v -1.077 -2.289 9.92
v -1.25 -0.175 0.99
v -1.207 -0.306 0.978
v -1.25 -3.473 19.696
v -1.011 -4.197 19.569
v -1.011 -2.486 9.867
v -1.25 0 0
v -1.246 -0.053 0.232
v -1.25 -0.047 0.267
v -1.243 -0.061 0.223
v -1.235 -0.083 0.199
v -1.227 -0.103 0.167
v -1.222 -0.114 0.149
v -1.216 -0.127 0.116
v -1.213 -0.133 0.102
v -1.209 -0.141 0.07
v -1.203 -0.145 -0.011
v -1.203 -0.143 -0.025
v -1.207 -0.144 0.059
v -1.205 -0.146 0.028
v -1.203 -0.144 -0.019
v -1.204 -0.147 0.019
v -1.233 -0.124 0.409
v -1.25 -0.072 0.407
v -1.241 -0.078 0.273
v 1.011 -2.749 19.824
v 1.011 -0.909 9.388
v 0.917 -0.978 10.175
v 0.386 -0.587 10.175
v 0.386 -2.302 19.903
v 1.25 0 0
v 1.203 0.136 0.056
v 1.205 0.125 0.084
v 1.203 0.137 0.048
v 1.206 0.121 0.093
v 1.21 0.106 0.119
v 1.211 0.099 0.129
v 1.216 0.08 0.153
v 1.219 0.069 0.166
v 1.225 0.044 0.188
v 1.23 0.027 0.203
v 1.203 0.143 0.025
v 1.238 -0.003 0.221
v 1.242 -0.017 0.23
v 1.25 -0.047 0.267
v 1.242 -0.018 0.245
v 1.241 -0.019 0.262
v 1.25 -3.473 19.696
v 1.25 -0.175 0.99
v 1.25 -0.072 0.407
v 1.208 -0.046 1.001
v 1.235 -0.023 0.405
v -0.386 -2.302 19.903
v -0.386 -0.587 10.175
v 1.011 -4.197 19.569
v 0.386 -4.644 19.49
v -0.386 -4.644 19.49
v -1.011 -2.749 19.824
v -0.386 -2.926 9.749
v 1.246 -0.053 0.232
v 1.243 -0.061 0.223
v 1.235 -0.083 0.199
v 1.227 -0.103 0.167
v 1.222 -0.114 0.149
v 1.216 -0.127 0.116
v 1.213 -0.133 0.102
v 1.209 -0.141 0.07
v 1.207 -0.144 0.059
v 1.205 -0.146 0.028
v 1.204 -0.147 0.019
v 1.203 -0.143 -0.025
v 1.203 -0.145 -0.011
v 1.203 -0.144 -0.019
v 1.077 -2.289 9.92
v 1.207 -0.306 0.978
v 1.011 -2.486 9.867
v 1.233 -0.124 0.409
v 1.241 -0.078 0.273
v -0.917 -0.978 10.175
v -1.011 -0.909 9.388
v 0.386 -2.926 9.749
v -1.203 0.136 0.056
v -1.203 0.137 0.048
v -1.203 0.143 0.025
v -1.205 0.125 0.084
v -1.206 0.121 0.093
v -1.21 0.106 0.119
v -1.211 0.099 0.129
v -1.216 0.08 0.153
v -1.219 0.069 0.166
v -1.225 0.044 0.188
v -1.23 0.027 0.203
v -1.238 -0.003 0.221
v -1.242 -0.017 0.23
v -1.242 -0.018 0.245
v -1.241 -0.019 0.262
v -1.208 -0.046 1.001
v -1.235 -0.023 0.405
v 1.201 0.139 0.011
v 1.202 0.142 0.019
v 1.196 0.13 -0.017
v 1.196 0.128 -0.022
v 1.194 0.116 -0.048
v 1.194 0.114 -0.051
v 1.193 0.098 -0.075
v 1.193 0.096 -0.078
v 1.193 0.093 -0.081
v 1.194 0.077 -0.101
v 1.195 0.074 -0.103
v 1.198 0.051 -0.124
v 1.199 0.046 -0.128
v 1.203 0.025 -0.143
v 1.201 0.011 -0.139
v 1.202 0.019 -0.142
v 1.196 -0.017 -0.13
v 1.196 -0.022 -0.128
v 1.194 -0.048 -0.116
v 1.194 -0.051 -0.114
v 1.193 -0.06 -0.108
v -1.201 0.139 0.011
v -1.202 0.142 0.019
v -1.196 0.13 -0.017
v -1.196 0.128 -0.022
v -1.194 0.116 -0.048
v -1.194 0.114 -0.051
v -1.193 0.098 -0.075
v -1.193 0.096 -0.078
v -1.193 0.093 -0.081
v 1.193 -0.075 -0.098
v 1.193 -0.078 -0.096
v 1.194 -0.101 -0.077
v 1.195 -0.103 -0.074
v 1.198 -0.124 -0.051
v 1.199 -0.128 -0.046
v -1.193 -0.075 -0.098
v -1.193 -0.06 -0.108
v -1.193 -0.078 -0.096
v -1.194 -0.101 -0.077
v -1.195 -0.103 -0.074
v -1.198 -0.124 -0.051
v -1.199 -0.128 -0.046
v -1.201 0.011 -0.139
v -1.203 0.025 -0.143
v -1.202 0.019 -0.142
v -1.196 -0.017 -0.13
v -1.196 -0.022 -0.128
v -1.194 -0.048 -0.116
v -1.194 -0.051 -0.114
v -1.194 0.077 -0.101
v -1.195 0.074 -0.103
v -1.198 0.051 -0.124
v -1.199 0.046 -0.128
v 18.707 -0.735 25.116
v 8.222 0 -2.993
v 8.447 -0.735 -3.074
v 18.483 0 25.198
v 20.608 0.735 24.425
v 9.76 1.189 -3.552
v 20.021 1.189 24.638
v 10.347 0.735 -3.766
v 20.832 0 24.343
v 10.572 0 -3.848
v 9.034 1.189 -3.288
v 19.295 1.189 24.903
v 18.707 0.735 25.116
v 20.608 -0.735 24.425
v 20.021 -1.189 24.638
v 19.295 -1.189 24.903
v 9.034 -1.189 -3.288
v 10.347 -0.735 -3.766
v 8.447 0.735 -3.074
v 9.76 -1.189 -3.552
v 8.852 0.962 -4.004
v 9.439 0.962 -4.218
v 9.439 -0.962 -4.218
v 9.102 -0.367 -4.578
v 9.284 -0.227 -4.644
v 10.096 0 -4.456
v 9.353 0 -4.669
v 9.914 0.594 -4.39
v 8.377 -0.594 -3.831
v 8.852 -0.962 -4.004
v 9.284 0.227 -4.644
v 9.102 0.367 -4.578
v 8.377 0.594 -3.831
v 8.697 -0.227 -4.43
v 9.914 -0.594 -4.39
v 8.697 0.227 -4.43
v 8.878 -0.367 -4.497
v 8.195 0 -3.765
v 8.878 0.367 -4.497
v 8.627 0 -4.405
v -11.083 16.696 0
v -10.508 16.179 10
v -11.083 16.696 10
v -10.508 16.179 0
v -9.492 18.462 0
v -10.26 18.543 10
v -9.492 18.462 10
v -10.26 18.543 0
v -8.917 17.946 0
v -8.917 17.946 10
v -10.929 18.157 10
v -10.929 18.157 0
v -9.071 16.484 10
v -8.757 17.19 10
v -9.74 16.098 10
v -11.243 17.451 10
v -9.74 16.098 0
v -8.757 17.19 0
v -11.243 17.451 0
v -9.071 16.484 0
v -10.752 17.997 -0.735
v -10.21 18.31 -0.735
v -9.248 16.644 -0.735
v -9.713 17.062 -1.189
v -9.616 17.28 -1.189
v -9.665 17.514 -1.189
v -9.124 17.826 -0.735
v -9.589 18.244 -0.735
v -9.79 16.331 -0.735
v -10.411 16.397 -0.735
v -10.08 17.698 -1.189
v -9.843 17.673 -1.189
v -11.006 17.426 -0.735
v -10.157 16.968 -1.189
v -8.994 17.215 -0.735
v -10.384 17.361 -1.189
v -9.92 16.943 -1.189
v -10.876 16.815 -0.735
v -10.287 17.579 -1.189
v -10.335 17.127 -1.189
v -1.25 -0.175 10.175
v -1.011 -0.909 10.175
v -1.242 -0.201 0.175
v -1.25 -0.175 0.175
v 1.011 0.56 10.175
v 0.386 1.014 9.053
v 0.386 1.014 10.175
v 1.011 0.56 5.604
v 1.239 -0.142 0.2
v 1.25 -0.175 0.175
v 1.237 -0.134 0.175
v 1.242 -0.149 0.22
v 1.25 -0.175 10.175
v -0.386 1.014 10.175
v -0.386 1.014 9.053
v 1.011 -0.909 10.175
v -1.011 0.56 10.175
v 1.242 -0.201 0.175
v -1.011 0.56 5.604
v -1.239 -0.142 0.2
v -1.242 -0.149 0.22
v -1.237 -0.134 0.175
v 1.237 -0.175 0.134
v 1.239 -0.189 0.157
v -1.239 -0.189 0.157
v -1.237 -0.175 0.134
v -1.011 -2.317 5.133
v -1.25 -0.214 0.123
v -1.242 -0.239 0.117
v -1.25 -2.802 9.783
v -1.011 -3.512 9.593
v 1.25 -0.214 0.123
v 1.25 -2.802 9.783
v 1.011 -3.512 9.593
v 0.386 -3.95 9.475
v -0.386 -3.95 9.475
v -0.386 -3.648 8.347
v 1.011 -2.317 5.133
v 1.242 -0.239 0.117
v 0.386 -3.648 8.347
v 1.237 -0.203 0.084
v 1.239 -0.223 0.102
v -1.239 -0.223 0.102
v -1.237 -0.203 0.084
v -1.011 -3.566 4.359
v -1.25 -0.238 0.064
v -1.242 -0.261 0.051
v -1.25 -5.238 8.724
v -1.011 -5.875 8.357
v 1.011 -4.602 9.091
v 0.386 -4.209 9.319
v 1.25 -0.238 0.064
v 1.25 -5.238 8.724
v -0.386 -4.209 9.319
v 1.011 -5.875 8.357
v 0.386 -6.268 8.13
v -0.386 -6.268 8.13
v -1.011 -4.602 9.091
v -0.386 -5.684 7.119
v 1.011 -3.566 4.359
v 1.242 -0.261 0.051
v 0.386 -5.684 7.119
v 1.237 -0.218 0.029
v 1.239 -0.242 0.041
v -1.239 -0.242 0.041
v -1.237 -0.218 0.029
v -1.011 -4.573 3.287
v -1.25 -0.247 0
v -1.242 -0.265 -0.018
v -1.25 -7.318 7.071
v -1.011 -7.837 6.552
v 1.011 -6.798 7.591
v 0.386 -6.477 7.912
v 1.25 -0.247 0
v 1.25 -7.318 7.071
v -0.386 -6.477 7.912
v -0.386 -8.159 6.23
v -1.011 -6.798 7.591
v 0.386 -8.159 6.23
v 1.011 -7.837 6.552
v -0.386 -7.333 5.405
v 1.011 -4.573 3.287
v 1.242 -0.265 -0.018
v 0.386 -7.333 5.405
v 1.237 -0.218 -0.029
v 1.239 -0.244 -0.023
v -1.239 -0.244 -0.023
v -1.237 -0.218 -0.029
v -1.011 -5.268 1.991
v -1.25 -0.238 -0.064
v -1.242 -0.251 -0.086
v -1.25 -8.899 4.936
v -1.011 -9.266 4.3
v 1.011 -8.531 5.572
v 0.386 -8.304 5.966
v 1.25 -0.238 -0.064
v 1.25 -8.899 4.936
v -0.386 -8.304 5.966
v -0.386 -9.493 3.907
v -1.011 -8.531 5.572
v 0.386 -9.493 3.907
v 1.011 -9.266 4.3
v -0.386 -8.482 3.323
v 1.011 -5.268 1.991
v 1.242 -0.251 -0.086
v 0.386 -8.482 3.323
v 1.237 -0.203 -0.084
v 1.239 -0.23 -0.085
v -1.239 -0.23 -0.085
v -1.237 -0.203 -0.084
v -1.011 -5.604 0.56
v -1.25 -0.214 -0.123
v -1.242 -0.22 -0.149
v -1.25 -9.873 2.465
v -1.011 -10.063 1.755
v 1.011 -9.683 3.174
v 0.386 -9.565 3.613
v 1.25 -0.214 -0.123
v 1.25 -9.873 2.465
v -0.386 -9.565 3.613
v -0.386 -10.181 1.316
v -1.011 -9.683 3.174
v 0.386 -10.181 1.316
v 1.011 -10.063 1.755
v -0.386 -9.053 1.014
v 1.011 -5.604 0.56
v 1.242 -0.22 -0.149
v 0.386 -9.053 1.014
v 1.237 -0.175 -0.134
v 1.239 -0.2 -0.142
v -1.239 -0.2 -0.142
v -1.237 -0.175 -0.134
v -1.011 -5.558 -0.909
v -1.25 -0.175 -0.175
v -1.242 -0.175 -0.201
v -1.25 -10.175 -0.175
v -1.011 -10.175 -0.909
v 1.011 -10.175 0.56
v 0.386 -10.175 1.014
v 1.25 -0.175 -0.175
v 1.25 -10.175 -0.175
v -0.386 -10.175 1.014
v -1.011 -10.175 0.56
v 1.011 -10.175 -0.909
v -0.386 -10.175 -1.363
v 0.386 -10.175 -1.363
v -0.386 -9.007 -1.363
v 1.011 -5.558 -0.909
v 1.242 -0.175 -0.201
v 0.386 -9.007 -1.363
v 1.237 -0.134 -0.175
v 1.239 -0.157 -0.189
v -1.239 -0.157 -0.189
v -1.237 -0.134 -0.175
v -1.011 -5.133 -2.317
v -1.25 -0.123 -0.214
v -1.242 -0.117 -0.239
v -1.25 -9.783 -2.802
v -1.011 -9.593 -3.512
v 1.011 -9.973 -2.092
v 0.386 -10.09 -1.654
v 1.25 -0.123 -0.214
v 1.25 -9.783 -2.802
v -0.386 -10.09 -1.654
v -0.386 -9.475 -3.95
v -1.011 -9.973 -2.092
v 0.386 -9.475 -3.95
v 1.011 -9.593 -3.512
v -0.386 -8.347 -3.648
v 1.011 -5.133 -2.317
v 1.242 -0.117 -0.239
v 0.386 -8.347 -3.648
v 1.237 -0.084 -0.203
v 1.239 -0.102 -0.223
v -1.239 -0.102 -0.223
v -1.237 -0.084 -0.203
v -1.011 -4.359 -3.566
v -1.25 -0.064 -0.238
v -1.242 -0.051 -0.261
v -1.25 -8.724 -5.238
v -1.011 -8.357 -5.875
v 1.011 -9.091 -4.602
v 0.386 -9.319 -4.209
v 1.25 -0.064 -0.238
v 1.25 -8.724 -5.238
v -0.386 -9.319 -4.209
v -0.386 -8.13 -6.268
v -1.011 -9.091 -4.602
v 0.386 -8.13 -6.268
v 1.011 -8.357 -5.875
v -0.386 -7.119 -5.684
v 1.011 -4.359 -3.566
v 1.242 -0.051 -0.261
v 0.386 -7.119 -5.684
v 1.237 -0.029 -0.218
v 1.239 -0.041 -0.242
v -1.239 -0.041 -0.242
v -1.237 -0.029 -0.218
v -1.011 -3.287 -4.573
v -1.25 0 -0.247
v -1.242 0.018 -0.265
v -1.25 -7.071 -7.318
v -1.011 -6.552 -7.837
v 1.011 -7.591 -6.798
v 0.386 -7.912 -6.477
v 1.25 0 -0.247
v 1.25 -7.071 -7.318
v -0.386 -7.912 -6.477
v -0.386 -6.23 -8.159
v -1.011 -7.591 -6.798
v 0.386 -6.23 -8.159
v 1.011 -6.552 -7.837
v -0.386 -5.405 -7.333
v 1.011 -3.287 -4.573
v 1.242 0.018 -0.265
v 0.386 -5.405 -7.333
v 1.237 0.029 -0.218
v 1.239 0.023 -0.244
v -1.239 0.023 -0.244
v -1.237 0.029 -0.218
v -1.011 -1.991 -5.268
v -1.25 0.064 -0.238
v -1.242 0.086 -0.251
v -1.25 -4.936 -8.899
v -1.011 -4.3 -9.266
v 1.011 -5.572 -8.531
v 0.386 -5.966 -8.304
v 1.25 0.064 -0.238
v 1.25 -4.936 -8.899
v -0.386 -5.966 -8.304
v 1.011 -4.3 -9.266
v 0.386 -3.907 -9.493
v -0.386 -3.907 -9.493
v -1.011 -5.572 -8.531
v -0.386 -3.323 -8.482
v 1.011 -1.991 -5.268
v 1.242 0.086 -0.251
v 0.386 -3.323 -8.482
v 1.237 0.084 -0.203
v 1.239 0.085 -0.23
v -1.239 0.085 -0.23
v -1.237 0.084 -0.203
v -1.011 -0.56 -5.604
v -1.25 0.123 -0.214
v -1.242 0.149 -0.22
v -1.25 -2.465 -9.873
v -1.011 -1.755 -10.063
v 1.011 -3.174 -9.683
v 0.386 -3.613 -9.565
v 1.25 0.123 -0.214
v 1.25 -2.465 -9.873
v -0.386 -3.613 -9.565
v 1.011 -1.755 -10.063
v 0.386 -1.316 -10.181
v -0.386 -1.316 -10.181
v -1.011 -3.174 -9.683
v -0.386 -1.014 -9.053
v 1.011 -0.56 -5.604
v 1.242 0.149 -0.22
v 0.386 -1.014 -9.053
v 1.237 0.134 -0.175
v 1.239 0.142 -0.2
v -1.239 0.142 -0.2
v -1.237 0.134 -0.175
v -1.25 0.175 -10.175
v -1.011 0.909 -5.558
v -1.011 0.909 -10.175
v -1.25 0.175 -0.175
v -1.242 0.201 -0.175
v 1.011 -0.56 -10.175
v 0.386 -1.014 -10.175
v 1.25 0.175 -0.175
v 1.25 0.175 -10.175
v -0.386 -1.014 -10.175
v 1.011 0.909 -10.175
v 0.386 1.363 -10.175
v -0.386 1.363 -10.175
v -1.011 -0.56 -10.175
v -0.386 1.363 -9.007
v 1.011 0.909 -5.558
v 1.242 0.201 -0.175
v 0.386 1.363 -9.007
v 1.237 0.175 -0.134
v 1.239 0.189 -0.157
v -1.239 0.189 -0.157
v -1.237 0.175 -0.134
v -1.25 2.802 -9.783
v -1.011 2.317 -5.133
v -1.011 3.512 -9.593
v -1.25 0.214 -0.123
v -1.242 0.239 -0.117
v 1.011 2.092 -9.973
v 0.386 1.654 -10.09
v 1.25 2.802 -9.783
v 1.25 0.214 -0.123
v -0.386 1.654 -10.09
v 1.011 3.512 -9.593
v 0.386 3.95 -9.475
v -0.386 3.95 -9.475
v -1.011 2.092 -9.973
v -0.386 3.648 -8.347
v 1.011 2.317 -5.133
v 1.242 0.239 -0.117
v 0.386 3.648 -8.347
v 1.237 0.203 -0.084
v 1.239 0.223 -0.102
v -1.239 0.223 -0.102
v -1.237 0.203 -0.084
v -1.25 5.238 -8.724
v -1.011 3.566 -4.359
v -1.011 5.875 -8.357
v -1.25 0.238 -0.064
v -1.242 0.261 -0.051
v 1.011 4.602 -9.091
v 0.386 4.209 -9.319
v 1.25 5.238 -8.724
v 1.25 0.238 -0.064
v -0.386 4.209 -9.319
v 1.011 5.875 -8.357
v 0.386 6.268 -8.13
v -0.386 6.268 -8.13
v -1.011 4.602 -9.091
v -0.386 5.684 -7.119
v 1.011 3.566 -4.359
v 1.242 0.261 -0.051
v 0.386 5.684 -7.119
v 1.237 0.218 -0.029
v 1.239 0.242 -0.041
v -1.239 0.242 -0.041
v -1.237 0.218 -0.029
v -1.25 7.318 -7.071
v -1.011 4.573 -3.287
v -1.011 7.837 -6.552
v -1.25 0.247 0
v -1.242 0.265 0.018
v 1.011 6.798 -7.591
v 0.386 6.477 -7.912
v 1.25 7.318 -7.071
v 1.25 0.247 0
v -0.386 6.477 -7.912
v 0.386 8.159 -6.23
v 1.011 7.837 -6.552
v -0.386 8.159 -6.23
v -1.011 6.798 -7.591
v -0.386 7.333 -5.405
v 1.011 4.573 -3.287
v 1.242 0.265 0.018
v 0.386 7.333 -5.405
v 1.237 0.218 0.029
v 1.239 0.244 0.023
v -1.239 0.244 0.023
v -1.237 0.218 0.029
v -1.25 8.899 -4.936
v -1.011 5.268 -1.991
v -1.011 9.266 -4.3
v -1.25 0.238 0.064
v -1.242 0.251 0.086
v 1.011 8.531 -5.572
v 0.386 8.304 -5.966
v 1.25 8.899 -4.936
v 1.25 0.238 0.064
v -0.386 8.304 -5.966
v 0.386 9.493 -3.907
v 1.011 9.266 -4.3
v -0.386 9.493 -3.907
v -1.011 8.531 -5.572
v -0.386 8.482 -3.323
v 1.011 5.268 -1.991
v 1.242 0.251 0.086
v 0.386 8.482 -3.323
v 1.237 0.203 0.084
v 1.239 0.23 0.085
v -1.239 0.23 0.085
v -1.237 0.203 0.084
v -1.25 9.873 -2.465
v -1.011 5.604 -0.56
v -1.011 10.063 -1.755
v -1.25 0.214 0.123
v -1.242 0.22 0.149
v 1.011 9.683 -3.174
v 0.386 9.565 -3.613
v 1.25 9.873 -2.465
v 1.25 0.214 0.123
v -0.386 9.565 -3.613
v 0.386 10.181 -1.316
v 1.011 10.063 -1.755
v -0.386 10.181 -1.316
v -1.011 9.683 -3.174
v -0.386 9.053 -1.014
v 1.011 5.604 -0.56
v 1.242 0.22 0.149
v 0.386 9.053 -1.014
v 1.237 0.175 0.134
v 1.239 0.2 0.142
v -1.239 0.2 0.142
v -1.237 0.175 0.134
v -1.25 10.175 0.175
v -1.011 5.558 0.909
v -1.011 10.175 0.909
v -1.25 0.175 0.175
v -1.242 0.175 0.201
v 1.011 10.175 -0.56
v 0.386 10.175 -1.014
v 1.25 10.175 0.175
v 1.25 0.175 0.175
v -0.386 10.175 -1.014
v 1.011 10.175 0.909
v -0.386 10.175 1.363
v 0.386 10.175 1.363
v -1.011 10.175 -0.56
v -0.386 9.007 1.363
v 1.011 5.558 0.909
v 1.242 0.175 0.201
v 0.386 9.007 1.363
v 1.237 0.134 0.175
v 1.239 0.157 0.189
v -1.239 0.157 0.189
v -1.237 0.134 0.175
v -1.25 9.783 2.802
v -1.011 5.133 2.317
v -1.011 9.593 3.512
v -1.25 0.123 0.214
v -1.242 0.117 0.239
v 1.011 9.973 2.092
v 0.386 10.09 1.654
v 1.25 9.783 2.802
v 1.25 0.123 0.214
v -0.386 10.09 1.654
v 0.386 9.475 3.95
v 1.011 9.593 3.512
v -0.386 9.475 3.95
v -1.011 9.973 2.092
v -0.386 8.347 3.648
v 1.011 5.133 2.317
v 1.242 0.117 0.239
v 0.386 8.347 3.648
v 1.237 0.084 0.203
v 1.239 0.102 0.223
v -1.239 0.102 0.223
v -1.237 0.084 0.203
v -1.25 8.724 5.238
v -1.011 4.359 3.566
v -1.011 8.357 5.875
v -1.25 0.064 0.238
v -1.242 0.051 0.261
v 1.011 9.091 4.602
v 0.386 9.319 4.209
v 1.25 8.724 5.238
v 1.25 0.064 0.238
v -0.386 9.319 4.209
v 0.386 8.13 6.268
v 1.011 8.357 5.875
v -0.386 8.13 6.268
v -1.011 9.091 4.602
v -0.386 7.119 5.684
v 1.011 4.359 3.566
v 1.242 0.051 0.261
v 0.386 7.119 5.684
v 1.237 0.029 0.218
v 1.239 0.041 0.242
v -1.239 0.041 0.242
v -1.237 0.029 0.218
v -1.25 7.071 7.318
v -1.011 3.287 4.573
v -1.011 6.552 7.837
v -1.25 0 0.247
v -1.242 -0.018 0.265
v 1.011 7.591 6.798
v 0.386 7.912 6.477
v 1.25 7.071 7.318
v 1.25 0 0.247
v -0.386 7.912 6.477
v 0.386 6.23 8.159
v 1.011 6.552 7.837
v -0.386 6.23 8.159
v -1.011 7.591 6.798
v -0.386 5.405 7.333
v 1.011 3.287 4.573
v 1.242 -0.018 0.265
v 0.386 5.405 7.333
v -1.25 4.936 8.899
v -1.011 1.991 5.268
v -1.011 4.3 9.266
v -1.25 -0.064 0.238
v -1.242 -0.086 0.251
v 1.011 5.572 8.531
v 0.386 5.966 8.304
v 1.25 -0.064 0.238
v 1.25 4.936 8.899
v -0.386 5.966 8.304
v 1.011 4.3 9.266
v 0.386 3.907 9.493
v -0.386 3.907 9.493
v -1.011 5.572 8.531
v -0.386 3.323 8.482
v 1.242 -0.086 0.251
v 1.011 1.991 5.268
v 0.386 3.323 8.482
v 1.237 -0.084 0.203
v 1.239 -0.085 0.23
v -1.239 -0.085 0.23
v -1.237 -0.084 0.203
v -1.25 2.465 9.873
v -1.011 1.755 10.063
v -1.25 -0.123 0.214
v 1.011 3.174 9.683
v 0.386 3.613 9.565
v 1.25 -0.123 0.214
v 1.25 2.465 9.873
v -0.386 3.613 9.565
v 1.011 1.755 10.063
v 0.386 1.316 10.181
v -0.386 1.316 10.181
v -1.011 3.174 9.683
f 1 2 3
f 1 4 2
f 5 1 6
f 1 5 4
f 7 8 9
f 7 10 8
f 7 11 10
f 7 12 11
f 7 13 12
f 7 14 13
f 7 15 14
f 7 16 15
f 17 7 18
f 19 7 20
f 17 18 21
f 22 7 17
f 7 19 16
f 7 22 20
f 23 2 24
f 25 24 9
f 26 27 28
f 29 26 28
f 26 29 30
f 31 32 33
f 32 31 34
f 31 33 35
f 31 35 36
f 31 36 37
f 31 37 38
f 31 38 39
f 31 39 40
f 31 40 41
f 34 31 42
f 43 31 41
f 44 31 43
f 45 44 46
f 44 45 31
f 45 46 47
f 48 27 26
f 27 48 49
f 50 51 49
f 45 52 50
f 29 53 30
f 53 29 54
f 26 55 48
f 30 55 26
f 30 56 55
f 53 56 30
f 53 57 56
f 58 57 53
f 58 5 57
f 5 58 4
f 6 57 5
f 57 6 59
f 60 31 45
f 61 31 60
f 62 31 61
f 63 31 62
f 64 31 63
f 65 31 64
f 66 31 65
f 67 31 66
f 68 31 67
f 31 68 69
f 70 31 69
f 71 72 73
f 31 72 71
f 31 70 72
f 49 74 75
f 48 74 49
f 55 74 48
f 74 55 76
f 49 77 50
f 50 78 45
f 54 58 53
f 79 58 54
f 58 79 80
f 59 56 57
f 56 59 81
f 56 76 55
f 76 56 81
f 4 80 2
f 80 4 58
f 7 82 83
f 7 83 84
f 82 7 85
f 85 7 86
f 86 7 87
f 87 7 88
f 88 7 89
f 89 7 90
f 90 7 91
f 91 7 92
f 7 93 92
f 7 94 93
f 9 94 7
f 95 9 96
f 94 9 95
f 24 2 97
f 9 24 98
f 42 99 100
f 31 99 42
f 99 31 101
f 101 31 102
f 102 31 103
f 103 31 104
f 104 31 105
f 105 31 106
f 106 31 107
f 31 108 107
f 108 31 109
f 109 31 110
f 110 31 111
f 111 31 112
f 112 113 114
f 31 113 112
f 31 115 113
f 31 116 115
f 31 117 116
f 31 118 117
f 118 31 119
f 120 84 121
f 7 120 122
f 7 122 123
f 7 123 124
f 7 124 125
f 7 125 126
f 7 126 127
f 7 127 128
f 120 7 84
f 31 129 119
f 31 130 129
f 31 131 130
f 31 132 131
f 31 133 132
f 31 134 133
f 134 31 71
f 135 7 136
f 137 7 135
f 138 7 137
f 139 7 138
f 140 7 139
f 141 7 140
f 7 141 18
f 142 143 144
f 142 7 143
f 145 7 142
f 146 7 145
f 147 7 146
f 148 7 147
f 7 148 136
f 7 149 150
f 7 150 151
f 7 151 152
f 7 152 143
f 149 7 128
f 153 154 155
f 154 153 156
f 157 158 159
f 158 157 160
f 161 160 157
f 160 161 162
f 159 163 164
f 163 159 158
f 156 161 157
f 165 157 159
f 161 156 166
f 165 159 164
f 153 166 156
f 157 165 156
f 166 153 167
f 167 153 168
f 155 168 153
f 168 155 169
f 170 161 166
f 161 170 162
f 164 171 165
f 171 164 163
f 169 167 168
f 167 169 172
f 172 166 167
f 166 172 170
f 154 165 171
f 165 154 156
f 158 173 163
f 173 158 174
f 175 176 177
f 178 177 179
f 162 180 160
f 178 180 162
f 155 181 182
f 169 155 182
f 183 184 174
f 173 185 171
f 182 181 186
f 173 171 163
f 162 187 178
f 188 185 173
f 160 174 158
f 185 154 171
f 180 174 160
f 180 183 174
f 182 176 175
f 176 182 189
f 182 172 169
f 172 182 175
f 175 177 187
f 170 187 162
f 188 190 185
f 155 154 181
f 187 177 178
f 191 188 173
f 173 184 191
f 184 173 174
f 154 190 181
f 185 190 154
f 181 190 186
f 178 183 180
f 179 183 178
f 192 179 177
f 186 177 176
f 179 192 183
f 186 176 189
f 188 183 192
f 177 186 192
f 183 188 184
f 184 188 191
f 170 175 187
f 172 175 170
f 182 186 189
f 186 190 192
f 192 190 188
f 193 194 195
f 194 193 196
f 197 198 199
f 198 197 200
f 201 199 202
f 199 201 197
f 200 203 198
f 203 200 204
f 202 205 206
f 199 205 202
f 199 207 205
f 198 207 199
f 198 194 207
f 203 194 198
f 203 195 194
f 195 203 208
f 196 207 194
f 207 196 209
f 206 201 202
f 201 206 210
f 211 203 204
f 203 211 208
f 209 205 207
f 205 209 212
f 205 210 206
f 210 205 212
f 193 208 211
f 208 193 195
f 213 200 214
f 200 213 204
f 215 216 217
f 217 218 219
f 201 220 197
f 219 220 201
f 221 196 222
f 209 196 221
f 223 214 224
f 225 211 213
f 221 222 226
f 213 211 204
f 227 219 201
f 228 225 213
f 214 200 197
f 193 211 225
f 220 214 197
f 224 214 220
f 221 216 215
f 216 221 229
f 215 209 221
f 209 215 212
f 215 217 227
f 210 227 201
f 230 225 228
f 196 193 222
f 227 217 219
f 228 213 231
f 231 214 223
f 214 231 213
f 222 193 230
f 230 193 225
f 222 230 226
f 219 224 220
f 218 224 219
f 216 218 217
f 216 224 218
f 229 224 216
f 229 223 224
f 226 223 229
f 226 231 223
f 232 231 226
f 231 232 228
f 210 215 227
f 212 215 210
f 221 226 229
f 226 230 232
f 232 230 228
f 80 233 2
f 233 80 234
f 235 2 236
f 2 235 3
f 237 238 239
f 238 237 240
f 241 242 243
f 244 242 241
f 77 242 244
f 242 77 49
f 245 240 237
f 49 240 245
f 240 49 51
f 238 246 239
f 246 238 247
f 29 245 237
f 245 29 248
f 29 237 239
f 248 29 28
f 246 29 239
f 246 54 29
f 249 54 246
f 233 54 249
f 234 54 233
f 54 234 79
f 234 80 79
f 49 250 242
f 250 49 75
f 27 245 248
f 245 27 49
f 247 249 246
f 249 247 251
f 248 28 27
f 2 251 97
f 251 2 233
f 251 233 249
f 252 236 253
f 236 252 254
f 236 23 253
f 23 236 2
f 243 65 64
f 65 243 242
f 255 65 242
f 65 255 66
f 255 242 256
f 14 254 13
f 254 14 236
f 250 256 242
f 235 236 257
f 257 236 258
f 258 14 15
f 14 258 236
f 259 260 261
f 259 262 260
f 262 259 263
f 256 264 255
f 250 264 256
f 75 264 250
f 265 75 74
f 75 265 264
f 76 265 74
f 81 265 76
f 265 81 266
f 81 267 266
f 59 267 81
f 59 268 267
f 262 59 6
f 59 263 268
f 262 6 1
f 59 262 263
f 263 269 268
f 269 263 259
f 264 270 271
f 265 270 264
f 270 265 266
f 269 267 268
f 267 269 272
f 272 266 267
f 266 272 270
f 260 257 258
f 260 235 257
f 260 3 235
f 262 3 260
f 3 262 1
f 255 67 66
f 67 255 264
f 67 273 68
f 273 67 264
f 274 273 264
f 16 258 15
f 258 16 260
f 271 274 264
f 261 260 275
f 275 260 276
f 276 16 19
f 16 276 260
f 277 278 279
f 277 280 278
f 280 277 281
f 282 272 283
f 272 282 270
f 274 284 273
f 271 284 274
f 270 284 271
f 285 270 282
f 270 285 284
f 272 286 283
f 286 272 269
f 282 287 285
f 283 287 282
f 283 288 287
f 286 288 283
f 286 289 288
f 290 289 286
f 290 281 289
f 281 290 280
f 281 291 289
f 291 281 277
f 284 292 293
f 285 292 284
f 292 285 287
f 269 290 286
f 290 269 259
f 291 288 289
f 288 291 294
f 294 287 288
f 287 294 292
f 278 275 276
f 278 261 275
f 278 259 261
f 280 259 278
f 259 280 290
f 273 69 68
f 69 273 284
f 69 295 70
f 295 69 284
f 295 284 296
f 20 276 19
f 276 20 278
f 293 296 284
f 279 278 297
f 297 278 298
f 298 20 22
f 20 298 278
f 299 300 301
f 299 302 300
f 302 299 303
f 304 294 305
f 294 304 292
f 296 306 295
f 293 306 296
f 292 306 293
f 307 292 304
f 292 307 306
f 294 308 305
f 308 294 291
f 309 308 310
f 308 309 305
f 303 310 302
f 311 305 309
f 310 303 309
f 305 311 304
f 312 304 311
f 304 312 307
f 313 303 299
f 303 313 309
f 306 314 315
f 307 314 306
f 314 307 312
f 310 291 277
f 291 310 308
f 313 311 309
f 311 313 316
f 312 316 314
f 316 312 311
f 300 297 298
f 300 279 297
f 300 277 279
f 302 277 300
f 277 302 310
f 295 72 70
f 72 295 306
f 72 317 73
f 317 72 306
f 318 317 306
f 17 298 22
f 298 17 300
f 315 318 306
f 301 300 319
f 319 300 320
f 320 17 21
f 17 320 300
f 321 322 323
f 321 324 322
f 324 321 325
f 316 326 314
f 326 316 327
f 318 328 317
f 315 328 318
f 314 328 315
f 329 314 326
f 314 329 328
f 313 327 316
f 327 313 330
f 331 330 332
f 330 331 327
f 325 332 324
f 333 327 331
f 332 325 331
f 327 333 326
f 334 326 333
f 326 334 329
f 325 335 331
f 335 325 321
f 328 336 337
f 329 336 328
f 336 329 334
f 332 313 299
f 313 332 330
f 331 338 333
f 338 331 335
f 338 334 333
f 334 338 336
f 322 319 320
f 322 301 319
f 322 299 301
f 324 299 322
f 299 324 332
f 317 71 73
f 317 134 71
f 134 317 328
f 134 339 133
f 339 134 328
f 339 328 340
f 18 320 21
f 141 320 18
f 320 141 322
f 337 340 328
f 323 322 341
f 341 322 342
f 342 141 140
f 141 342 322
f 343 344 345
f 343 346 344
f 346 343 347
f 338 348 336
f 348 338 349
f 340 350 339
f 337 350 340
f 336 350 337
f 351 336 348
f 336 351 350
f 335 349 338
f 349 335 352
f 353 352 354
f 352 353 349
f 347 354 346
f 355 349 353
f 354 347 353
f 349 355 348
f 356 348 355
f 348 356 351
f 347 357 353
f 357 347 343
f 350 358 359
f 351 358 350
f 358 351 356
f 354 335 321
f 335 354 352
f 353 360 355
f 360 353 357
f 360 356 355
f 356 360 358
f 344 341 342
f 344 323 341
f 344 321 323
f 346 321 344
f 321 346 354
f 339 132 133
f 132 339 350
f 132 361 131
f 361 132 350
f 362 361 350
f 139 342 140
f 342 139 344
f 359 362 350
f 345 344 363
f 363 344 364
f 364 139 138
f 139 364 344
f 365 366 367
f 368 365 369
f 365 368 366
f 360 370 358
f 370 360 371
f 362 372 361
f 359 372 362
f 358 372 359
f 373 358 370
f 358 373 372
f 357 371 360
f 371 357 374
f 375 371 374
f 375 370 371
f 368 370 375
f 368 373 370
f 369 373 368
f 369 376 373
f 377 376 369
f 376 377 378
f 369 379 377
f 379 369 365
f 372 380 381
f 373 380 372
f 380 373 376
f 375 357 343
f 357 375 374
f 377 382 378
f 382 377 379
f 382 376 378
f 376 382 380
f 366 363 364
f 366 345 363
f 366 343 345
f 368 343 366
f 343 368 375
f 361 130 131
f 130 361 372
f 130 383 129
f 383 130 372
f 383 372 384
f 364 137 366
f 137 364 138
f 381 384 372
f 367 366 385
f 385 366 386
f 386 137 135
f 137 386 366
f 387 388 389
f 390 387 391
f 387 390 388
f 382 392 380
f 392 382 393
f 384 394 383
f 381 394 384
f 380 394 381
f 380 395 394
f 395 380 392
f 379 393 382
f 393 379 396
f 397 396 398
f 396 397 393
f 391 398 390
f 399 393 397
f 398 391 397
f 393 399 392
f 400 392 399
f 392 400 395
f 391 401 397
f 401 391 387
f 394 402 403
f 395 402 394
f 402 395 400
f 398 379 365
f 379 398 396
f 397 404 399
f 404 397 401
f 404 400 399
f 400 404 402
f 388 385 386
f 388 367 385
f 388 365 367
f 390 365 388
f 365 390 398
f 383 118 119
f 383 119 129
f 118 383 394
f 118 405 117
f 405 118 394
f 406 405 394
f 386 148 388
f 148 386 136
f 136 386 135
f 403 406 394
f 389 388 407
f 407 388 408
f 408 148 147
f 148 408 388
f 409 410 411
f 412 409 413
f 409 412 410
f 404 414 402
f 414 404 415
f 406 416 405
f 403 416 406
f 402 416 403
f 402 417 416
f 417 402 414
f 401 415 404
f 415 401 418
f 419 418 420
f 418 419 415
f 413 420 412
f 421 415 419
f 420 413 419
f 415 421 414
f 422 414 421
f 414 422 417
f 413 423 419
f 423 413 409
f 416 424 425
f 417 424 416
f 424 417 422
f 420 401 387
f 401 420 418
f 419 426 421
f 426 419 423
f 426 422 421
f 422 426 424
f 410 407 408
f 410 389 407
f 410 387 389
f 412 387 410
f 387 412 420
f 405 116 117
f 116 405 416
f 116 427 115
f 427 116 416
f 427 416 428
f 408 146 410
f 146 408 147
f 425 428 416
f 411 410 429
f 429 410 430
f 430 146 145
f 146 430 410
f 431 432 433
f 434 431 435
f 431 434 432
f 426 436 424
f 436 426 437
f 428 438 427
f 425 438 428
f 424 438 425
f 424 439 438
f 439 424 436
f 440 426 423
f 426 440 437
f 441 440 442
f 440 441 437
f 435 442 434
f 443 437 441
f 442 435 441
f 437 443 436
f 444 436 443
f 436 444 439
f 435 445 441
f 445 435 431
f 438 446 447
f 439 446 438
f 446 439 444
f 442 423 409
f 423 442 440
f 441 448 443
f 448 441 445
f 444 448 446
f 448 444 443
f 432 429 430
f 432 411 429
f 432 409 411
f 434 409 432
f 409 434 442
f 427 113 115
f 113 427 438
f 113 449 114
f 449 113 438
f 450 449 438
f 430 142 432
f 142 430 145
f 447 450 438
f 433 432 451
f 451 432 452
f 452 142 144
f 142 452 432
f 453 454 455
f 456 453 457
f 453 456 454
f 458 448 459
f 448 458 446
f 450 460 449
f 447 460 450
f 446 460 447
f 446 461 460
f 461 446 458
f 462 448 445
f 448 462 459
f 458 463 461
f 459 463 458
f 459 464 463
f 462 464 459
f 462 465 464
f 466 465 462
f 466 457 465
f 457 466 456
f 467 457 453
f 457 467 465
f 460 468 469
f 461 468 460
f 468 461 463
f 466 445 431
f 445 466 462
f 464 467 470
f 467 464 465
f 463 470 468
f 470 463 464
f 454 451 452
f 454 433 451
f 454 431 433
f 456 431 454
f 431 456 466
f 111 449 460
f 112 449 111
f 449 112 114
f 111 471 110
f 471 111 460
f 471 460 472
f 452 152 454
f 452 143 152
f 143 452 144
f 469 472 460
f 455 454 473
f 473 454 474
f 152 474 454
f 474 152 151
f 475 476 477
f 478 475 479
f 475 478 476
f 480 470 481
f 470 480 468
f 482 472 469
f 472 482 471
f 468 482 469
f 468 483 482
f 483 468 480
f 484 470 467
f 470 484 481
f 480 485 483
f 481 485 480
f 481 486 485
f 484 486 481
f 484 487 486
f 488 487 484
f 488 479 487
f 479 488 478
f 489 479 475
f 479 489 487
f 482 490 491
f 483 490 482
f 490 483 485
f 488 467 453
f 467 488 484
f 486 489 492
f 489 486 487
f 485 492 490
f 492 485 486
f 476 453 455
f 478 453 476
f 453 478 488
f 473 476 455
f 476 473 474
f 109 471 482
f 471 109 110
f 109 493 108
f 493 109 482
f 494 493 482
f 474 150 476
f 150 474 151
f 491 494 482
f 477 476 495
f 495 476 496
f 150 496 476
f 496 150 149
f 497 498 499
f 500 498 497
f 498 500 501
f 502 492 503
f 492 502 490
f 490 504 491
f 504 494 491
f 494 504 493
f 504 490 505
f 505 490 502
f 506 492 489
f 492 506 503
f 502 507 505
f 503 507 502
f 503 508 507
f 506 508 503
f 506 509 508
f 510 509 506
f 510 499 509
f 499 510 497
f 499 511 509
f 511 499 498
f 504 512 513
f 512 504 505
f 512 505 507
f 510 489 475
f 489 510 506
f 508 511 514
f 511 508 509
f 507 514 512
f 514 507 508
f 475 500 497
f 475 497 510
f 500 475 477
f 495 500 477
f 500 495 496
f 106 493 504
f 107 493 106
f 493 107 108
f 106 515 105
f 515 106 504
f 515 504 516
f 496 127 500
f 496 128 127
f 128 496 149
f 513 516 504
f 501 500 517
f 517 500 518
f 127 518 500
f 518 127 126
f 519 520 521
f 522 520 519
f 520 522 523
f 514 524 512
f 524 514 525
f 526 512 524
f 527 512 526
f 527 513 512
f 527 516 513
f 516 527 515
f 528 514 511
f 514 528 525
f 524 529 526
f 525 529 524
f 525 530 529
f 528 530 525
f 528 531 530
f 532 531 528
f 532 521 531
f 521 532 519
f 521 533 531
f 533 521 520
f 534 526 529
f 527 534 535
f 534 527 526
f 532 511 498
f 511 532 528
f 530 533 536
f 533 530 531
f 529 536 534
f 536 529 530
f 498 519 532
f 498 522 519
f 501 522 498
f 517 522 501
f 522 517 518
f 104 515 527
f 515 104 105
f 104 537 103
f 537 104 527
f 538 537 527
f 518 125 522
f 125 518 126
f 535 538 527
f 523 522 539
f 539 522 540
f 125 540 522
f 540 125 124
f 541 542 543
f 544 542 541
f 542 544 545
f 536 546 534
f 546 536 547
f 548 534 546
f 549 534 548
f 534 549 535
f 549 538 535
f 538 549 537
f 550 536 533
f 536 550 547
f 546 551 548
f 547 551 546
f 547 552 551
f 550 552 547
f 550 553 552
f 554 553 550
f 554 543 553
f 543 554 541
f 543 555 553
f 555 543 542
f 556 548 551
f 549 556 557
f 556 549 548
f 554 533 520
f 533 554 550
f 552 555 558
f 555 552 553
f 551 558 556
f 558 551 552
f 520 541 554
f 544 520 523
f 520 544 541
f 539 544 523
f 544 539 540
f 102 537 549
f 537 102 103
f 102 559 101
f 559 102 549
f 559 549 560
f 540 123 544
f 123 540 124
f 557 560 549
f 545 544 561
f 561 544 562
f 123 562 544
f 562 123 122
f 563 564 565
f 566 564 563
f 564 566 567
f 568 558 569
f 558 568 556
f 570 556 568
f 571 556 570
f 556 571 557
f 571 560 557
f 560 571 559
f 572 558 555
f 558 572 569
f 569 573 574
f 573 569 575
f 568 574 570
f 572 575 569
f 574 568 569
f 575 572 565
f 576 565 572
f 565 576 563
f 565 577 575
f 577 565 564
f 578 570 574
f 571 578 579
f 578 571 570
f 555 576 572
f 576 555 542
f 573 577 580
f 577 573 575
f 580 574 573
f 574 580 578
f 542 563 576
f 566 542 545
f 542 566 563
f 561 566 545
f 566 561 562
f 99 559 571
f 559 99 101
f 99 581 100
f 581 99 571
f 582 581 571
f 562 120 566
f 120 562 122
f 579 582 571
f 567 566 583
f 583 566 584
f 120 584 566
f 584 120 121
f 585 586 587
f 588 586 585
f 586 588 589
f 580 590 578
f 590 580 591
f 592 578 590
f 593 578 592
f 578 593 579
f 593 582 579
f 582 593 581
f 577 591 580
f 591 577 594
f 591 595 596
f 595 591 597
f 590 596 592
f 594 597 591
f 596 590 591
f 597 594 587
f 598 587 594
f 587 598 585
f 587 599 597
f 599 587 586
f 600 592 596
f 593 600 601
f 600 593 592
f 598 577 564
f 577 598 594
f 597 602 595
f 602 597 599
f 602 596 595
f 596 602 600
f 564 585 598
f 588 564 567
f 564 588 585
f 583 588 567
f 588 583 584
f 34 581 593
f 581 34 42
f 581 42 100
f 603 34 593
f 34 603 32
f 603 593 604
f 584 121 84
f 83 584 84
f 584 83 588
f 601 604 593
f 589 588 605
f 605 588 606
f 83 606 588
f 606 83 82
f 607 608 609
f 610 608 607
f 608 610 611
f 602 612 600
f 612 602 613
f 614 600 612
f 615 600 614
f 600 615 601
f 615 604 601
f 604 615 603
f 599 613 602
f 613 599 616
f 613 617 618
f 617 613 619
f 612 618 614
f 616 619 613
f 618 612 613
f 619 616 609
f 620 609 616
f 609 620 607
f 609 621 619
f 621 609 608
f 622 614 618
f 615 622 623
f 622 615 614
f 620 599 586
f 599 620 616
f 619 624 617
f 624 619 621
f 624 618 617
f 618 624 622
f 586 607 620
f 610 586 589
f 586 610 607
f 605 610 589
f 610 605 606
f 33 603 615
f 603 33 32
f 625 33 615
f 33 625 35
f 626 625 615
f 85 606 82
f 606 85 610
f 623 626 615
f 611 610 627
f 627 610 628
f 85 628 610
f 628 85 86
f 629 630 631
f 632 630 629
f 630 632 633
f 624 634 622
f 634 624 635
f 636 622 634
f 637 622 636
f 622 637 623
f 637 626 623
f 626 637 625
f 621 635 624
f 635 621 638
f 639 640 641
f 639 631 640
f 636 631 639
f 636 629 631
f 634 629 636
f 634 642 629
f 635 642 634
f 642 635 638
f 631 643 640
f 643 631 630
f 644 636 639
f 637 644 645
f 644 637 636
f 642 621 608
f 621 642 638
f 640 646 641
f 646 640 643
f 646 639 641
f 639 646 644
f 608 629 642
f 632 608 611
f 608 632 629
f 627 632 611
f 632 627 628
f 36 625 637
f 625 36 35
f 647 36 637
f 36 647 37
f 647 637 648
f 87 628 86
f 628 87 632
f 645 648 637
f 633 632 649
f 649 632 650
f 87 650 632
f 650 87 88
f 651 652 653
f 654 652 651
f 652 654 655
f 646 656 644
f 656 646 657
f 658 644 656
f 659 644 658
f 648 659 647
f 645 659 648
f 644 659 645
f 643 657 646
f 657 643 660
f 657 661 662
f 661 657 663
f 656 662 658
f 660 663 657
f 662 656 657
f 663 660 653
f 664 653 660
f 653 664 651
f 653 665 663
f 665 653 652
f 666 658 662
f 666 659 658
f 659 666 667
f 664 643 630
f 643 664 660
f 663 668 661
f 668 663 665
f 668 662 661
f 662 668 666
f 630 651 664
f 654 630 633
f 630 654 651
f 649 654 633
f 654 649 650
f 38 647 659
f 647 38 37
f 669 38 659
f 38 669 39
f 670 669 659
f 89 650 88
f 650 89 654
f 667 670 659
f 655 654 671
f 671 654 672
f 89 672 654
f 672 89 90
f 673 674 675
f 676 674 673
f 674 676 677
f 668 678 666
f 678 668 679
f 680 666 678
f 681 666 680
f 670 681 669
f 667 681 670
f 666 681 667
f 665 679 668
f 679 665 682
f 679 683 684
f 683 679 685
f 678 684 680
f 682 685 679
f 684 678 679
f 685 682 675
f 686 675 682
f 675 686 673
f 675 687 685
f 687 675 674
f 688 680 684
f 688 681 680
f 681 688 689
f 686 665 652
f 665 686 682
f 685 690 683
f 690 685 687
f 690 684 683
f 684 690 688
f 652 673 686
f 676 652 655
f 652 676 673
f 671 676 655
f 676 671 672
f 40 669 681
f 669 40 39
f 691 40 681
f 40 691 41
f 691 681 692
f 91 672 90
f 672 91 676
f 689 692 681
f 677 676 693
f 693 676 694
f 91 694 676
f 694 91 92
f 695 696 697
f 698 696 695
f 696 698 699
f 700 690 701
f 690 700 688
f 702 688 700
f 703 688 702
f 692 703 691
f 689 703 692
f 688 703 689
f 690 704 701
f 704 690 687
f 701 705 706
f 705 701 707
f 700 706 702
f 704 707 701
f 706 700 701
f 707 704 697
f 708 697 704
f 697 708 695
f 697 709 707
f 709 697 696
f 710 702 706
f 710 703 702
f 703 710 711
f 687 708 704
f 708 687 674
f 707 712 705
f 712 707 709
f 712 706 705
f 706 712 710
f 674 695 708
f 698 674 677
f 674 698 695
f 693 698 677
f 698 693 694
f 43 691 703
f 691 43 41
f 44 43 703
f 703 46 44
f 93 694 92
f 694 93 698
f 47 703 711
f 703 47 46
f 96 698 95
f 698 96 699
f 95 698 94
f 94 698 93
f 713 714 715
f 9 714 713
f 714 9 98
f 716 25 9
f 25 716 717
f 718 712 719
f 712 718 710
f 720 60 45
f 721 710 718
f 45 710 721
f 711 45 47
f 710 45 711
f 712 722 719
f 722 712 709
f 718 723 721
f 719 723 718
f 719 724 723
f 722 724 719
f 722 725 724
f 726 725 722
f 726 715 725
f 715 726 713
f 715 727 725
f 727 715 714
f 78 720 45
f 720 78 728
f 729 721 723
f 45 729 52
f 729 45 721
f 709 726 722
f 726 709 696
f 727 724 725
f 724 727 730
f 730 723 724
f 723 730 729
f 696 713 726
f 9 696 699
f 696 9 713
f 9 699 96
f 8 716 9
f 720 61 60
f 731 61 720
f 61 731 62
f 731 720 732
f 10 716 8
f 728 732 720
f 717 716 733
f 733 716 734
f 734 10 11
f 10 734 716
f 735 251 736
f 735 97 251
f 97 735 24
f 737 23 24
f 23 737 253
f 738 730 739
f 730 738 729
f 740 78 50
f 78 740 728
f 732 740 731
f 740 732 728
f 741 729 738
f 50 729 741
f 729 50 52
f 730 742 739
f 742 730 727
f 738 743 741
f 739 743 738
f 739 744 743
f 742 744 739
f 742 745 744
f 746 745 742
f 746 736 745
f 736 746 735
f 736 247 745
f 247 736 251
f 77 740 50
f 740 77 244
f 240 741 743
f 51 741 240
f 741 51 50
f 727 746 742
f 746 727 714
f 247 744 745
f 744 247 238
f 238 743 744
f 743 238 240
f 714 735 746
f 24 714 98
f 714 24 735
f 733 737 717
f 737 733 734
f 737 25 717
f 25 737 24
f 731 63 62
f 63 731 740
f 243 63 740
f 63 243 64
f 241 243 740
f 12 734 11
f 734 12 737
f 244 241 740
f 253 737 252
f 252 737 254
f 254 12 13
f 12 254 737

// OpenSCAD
$fa = 2;
$fn = 10;

inner_radius = 1.25;
current_pos = [0.0, 0.0, 0.0];
current_orien = [0.0, 0.0, 1.0];
segment_length = 10.0;

module capillary(from, orien, length) {
    rotate( orien ){
        translate( from ){
            cylinder($fa = $fa, $fn = $fn, h=length, r=inner_radius, center=false);
            sphere($fa = $fa, $fn = $fn, r=inner_radius);
        }
    }
}


capillary(from = [0.0, 0.0, 0.0],
          orien = [10.0, 0.0, 0.0],
          length = 20.0);

capillary(from = [10.0, 0.0, 0.0],
          orien = [0.0, 20.0, 0.0],
          length = 30.0);

capillary(from = [0.0, 20.0, 0.0],
          orien = [0.0, 0.0, 30.0],
          length = 10.0);



for(d_pos = [ 0 : 15 : 360]){
    
    capillary( current_pos, current_orien, segment_length );
    
    o = current_orien;
    p = [ 0.0, 0.0, 1.0 ];
    
    // Update current_pos to coincide with the end of the last segment.
    d_U = [ (cos(o.x)*cos(o.y)*p.x + (cos(o.x)*sin(o.y)*sin(o.z) - sin(o.x)*cos(o.z))*p.y + (cos(o.x)*sin(o.y)*cos(o.z) + sin(o.x)*sin(o.z))*p.z),
            (sin(o.x)*cos(o.y)*p.x + (sin(o.x)*sin(o.y)*sin(o.z) + cos(o.x)*cos(o.z))*p.y + (sin(o.x)*sin(o.y)*cos(o.z) - cos(o.x)*sin(o.z))*p.z),
            (-sin(o.y)*p.x + cos(o.y)*sin(o.z)*p.y + cos(o.y)*sin(o.z)*p.z) ];

    
      
//    current_orien = current_orien + d_orien;
    current_pos = [ current_pos.x + segment_length * d_U.x,
                    current_pos.y + segment_length * d_U.y,
                    current_pos.z + segment_length * d_U.z ];
    current_orien = [ d_pos, 0.0, 0.0 ];

    echo(d_U.x, " ", d_U.y, " ", d_U.z);
    
}
